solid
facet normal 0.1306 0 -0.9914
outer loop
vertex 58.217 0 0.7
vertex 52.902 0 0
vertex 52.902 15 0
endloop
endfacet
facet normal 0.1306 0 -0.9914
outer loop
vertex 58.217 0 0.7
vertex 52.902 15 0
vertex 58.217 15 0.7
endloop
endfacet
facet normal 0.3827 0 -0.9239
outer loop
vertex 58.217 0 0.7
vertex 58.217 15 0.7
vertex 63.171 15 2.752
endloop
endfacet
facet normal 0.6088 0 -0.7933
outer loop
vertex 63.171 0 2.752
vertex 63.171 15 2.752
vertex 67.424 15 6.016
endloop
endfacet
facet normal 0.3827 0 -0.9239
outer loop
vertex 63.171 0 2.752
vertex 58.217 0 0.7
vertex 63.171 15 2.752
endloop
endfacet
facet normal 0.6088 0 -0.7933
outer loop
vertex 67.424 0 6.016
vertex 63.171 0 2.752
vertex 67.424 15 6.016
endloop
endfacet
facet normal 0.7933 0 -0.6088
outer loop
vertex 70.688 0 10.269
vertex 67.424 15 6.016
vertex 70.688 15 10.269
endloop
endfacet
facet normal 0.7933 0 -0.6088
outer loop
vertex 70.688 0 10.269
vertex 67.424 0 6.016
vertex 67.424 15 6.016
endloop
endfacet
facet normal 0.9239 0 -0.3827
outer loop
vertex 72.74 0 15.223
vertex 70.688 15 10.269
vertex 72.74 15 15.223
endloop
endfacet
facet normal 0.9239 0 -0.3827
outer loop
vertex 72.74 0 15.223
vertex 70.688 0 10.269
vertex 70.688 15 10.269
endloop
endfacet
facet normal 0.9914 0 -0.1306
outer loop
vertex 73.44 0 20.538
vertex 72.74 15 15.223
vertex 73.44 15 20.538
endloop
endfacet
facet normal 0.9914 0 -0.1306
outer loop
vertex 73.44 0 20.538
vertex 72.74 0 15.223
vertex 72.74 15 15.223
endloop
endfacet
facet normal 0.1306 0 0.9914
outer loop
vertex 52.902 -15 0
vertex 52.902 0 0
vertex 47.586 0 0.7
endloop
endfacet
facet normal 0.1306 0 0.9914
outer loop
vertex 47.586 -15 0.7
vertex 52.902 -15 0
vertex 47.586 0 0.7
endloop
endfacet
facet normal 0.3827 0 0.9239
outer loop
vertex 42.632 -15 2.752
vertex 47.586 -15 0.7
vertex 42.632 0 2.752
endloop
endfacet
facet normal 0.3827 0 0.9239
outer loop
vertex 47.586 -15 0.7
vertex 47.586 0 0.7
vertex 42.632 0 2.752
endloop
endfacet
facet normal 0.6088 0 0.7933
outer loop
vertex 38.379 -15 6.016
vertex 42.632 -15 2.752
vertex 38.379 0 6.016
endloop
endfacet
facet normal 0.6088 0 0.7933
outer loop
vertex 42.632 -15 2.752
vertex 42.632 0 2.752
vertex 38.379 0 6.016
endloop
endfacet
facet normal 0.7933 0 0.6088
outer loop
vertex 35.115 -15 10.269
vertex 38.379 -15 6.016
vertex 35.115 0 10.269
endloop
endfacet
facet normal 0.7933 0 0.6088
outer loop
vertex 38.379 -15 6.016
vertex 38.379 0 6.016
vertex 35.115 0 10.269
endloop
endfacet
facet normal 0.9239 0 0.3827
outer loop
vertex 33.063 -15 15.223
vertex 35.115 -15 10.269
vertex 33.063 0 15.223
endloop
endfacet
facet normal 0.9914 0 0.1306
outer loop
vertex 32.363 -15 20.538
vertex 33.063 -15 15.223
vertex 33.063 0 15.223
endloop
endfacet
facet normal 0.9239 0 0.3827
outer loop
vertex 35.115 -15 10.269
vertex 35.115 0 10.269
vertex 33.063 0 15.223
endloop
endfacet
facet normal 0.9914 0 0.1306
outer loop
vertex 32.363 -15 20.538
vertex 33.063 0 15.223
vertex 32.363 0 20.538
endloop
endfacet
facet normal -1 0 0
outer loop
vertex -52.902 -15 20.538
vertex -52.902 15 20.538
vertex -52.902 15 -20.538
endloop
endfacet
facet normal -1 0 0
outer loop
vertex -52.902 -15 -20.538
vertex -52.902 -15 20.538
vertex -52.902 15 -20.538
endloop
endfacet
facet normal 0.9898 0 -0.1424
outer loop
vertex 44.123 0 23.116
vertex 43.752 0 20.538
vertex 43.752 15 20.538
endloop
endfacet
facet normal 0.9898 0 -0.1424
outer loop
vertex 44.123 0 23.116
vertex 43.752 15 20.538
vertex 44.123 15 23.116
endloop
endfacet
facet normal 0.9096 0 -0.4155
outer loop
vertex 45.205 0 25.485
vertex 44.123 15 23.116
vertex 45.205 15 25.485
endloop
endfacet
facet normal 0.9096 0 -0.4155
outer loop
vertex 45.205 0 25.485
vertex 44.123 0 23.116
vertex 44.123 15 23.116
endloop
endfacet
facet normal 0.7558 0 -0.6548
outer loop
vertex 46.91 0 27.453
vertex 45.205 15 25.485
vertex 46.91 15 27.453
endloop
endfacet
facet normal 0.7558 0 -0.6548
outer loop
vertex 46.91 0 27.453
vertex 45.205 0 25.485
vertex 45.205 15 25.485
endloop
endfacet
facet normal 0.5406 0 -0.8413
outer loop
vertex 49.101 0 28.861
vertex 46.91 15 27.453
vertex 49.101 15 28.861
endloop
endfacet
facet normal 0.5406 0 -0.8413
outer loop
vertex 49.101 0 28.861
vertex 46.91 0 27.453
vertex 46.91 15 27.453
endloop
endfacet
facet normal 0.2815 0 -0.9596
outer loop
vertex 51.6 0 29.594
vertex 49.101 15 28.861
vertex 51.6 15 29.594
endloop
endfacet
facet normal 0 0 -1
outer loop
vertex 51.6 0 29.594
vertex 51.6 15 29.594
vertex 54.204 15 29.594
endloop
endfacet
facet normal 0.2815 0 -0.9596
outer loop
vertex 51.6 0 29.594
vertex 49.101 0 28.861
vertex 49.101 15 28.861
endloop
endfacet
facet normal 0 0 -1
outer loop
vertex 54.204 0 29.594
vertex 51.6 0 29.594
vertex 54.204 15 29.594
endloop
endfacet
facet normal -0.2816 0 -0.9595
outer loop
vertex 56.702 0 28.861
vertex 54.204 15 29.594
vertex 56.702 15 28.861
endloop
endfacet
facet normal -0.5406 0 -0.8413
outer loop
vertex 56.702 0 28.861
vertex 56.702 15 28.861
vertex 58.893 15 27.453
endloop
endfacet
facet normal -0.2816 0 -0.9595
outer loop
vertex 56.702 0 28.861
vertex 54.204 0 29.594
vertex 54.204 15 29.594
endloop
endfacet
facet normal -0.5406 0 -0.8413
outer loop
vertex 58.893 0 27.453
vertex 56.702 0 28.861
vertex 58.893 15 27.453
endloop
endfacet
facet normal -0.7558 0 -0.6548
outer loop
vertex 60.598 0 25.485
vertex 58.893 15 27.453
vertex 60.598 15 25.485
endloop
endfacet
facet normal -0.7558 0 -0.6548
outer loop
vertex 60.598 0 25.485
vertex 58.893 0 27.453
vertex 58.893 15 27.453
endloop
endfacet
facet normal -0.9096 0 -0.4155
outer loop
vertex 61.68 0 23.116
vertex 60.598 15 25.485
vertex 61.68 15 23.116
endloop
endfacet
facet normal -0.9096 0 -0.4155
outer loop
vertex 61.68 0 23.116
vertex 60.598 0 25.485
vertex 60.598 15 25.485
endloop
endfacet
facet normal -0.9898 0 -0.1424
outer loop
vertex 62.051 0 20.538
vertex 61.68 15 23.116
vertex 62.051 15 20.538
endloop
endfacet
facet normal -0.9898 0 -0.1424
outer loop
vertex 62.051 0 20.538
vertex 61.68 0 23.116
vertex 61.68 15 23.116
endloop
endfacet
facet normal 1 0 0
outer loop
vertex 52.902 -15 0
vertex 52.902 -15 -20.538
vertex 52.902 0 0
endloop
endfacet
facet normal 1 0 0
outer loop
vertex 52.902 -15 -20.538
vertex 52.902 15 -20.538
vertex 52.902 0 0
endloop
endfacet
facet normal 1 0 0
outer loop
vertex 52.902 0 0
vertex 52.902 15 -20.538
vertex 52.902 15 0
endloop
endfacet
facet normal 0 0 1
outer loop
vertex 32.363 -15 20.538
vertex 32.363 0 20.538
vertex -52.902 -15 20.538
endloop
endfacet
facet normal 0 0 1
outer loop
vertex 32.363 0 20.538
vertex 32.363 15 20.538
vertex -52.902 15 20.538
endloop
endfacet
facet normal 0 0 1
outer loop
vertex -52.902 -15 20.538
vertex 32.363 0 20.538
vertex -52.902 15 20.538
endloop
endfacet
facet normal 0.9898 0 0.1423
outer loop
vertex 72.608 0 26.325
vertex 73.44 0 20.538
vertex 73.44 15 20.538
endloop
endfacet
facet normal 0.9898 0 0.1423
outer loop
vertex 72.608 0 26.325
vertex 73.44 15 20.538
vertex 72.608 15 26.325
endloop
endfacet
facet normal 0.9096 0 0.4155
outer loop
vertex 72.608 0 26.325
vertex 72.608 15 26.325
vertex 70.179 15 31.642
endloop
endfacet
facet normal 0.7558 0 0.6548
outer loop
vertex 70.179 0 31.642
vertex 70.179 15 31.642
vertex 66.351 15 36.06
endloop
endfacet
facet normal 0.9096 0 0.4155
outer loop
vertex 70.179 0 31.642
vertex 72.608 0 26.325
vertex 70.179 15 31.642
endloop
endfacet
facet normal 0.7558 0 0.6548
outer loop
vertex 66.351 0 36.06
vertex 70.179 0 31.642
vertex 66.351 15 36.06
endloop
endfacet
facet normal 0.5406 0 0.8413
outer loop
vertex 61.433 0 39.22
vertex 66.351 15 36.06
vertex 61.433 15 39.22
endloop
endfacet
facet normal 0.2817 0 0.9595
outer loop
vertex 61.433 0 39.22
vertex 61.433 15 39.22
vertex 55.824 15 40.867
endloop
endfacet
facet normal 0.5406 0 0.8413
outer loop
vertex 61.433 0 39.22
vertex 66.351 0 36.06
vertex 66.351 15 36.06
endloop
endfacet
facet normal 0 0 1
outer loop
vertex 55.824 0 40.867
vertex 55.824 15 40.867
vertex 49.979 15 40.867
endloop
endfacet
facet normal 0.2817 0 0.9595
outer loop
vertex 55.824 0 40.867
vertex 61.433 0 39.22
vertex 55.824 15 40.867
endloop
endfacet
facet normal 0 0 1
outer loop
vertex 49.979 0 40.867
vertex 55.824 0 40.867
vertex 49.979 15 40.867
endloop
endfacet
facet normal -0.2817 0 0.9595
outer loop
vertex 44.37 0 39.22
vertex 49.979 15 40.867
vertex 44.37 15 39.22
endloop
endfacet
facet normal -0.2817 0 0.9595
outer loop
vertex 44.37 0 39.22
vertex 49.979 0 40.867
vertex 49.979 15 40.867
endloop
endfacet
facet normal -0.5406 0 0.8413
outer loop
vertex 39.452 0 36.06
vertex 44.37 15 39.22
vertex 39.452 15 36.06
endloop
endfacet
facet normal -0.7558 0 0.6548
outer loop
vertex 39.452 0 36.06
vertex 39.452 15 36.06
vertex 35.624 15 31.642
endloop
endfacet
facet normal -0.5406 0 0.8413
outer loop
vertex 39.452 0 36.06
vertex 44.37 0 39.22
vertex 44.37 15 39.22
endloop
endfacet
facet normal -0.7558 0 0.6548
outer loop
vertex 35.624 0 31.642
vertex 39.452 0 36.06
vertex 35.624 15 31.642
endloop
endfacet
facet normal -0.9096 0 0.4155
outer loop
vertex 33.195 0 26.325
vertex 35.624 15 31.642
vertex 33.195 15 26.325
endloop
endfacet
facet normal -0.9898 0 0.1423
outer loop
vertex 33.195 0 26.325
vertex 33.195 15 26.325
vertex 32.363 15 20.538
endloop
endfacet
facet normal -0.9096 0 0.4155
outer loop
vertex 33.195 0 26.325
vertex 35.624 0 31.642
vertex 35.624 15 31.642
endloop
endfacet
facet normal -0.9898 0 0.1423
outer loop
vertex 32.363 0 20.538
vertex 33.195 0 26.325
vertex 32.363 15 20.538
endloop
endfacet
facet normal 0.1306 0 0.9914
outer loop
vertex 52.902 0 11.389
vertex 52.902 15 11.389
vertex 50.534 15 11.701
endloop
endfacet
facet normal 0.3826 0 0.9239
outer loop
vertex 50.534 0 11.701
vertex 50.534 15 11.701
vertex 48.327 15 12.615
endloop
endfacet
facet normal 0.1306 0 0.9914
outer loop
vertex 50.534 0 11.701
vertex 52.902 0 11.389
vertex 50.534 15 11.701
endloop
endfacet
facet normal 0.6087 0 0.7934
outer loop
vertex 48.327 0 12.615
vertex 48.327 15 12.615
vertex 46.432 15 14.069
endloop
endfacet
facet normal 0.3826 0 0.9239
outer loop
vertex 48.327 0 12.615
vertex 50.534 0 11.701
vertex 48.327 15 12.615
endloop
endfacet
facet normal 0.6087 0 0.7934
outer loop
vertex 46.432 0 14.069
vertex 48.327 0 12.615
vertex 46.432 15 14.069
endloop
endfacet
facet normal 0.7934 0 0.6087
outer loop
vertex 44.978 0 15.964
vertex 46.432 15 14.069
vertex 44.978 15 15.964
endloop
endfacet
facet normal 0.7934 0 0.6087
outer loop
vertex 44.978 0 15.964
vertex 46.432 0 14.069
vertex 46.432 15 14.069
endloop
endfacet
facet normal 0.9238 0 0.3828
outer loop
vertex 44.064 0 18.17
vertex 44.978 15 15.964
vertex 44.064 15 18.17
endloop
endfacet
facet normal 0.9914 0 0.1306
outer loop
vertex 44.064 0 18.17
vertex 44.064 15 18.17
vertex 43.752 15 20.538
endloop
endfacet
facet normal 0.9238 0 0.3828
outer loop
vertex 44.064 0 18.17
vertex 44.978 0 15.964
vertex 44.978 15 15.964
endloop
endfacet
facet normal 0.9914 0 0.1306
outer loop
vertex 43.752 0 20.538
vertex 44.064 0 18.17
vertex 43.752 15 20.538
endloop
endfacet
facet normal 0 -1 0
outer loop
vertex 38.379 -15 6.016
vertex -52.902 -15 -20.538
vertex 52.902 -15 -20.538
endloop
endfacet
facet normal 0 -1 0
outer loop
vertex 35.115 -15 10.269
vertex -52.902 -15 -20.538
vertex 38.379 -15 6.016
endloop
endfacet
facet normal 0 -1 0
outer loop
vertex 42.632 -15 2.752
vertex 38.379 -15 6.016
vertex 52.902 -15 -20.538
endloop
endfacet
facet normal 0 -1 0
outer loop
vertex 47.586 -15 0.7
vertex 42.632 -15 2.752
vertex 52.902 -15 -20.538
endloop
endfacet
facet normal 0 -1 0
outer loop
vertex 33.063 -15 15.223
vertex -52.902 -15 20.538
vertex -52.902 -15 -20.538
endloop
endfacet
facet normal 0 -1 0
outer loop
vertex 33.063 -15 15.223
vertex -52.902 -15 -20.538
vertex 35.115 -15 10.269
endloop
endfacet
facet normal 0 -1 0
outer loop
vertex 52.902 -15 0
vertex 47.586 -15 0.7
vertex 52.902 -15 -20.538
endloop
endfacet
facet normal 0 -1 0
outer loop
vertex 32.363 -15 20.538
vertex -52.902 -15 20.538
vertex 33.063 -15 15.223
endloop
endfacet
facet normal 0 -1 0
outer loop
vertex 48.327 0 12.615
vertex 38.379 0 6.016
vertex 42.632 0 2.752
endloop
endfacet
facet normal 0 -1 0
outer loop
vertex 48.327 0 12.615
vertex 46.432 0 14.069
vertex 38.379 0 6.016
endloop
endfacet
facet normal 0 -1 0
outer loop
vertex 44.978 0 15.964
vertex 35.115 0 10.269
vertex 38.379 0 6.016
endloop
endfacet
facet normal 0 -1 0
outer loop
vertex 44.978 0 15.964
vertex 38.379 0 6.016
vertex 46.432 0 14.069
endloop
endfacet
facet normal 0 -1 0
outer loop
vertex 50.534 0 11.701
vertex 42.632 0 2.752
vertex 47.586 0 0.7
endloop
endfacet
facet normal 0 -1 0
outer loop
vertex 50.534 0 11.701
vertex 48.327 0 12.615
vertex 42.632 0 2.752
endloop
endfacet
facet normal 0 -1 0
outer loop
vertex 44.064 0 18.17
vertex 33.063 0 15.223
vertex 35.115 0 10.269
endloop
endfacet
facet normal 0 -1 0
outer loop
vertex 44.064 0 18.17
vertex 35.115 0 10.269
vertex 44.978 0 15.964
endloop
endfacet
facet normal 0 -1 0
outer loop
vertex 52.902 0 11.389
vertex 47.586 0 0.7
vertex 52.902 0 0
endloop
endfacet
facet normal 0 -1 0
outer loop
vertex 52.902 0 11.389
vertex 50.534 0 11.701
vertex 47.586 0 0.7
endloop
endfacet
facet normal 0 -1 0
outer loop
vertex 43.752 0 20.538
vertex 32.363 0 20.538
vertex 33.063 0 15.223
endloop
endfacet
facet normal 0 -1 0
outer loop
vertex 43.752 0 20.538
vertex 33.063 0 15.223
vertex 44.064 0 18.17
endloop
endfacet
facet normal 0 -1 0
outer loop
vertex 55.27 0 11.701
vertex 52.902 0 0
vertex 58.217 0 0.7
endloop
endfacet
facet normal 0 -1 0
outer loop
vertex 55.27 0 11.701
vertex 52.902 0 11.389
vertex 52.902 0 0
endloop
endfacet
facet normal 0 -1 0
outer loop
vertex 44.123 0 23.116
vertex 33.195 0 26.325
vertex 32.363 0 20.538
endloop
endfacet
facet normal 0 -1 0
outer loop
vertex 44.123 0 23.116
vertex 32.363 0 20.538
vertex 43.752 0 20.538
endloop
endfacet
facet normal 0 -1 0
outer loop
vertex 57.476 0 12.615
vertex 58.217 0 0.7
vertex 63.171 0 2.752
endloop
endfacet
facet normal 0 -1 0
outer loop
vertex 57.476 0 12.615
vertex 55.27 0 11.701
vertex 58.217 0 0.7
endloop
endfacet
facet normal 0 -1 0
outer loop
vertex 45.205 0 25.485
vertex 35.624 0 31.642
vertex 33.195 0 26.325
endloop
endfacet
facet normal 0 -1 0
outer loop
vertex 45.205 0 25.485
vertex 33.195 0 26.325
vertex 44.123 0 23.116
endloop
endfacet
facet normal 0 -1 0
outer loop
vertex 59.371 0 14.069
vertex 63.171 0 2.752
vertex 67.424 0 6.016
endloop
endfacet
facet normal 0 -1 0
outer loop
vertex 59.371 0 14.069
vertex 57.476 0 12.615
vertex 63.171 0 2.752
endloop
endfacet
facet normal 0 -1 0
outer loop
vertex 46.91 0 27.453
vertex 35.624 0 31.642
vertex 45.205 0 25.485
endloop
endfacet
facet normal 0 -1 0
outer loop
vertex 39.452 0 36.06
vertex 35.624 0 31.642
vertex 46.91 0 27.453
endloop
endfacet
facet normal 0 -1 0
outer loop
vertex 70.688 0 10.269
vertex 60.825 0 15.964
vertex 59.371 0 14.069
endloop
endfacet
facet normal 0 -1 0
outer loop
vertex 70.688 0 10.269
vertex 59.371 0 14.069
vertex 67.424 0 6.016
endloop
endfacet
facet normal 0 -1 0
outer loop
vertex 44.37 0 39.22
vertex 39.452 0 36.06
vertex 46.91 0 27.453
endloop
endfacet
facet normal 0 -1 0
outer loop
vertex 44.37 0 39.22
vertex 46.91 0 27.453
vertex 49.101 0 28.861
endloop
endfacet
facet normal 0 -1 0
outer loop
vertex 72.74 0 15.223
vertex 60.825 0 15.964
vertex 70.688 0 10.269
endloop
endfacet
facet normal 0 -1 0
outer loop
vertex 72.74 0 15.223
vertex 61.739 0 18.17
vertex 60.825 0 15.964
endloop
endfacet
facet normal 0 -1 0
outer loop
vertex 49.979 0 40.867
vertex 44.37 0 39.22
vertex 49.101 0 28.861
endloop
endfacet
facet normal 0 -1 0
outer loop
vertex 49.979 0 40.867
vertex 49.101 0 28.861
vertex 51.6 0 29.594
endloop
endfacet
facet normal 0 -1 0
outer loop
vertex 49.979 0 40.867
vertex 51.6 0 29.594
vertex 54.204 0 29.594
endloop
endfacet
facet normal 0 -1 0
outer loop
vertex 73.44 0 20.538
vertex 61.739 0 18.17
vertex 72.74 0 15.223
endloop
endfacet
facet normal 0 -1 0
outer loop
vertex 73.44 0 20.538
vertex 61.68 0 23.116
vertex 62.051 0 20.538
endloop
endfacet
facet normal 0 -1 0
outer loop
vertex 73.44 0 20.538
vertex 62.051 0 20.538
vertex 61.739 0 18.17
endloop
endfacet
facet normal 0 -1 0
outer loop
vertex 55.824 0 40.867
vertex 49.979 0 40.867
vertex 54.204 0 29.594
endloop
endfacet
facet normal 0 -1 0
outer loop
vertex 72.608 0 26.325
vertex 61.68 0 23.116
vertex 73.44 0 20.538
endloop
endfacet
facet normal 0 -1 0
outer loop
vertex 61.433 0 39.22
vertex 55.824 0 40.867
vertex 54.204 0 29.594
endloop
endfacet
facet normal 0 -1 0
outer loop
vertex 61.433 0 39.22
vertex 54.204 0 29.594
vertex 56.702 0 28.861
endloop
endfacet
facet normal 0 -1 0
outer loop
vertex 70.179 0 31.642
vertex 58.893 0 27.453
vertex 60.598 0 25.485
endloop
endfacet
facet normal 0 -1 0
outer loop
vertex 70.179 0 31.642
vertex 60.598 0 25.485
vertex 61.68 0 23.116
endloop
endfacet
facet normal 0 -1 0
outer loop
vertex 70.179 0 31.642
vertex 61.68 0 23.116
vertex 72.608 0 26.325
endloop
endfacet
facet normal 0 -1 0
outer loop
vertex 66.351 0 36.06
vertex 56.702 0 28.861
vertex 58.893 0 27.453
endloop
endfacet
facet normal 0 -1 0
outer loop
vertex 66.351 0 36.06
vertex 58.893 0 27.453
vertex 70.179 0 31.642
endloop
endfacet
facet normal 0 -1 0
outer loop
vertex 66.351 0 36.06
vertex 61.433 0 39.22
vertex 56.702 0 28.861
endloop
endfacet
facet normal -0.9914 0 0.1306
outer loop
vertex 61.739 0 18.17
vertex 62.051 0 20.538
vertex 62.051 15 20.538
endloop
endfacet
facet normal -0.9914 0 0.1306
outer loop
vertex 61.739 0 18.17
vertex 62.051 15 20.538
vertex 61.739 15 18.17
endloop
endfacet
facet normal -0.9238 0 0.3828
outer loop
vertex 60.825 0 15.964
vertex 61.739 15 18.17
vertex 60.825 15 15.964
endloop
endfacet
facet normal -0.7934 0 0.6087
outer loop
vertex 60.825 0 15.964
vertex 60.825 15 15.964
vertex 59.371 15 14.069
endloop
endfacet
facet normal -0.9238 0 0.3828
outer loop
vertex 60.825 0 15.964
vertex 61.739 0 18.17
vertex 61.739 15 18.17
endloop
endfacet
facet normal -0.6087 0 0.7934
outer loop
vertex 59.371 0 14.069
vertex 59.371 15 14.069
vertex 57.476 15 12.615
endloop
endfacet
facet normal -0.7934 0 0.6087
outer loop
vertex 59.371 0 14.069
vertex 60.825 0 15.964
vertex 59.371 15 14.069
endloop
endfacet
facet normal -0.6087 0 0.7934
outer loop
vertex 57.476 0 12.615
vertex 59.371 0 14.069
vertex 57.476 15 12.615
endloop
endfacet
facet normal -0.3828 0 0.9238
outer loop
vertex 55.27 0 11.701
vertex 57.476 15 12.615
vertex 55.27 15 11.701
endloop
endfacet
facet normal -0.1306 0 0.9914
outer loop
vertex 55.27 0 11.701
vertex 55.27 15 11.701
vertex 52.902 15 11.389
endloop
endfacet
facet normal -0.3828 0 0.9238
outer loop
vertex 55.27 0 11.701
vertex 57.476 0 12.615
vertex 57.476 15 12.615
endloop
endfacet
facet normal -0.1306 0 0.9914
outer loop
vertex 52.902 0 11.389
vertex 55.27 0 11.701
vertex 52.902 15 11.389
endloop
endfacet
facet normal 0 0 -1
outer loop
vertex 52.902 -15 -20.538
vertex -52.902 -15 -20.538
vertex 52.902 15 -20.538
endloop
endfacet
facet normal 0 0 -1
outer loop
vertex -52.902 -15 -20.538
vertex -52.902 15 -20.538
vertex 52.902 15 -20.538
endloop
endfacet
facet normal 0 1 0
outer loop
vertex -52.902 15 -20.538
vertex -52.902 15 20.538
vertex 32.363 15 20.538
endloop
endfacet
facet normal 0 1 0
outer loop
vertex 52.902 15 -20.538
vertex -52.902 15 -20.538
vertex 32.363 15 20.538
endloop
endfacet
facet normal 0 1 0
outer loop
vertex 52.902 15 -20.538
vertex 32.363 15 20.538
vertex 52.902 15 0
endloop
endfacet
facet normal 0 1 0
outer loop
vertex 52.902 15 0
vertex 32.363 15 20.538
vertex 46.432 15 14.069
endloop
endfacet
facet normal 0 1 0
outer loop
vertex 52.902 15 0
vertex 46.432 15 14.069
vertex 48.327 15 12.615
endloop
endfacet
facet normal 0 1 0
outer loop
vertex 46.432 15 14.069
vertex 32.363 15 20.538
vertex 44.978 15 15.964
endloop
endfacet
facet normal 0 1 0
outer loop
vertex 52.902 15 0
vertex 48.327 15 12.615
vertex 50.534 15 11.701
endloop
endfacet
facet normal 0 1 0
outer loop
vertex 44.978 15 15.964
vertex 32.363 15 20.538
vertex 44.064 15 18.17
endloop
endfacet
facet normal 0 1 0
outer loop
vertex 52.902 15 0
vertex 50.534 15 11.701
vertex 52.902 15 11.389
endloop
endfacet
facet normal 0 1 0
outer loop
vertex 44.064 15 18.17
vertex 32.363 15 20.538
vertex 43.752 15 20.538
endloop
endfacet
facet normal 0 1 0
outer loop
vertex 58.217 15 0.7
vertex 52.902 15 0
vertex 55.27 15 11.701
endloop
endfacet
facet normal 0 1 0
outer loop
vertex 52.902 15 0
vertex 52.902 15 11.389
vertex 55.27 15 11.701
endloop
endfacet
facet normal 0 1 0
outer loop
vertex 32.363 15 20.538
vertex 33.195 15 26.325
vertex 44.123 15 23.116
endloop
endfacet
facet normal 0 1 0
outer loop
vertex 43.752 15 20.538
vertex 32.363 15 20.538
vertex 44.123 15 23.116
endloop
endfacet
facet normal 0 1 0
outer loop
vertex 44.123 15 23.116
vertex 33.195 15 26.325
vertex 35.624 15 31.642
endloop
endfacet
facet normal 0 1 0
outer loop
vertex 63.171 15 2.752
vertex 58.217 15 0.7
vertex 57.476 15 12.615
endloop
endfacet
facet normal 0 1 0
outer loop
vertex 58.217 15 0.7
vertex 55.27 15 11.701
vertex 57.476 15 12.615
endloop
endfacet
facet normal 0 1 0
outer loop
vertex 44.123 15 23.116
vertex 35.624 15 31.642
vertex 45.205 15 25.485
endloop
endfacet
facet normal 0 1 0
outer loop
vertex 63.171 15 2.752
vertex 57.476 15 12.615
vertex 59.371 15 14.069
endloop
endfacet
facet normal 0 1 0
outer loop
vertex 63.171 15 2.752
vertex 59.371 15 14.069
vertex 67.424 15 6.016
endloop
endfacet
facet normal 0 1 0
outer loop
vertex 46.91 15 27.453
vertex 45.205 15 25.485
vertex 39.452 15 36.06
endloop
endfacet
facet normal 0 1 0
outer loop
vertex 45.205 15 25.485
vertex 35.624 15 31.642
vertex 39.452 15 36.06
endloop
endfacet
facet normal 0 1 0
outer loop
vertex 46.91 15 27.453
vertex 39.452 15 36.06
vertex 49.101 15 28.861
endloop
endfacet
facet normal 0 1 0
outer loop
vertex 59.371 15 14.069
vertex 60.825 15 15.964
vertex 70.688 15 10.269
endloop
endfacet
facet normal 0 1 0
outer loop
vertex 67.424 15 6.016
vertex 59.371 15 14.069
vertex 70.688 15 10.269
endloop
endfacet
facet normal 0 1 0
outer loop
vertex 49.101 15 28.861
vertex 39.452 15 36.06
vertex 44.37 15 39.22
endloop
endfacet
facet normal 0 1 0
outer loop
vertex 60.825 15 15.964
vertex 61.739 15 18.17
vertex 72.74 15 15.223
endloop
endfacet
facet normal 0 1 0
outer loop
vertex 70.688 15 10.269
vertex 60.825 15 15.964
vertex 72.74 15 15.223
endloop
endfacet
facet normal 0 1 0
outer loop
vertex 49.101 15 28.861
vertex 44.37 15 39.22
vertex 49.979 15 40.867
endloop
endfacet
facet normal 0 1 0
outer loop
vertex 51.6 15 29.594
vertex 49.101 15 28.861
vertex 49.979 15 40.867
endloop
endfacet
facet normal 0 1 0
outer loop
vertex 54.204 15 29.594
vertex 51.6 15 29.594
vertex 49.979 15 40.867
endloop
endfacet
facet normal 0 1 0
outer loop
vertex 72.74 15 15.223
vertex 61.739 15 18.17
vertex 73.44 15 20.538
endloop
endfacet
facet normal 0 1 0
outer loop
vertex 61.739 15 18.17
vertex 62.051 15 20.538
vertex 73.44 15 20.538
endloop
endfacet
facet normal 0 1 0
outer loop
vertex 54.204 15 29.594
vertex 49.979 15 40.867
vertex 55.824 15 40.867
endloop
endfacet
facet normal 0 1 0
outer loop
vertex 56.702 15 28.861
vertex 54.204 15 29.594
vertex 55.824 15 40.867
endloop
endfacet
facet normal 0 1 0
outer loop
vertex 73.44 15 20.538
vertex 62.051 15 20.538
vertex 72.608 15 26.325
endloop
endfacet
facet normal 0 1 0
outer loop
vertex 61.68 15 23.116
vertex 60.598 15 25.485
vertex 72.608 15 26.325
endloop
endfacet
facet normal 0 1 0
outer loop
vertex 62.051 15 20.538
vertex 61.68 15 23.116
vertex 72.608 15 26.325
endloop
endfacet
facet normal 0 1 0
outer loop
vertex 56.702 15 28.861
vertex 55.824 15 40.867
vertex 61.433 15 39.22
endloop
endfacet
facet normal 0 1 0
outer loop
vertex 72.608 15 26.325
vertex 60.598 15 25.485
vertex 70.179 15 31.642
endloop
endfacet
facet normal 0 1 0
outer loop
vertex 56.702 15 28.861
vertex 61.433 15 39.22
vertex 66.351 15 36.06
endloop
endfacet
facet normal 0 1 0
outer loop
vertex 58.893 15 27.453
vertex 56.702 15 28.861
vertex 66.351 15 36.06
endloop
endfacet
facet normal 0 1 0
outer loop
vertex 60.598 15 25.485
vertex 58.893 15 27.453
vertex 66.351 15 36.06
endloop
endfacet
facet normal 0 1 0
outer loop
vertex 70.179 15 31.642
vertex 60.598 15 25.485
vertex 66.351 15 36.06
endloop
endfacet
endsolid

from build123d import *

# Parameters (mm, degrees)
F1_DEPTH = 15
F2_DEPTH = 15
F3_DEPTH = 15


with BuildPart() as f1:
    # F0 (on Front) → F1 (new body)
    with BuildSketch(Plane.XZ):
        with BuildLine():
            Line((-52.9015958309, 20.53822577), (-52.9015958309, -20.53822577))
            Line((-52.9015958309, -20.53822577), (52.9015958309, -20.53822577))
            Line((52.9015958309, -20.53822577), (52.9015958309, 0))
            ThreePointArc((52.9015958309, 0), (38.3788771154, 6.0155070545), (32.3633700609, 20.53822577))
            Line((32.3633700609, 20.53822577), (-52.9015958309, 20.53822577))
        make_face()
    extrude(amount=-F1_DEPTH)

    # F2 (add): a face of the model
    f2_faces = [f1.faces().sort_by_distance(p)[0] for p in [
        (-3.6461449369, 0, -0.9755146466),
    ]]
    extrude(f2_faces, amount=F2_DEPTH)

    # F0 (on Front) → F3 (join)
    with BuildSketch(Plane.XZ):
        with BuildLine():
            Line((52.9015958309, 11.3889886989), (52.9015958309, 0))
            ThreePointArc((52.9015958309, 0), (67.4243145464, 6.0155070545), (73.4398216009, 20.53822577))
            ThreePointArc((73.4398216009, 20.53822577), (52.9015958309, 41.07645154), (32.3633700609, 20.53822577))
            Line((32.3633700609, 20.53822577), (43.7523587598, 20.53822577))
            ThreePointArc((43.7523587598, 20.53822577), (52.9015958309, 29.6874628411), (62.050832902, 20.53822577))
            ThreePointArc((62.050832902, 20.53822577), (59.3710834066, 14.0687381943), (52.9015958309, 11.3889886989))
        make_face()
        with BuildLine():
            ThreePointArc((32.3633700609, 20.53822577), (38.3788771154, 6.0155070545), (52.9015958309, 0))
            Line((52.9015958309, 0), (52.9015958309, 11.3889886989))
            ThreePointArc((52.9015958309, 11.3889886989), (46.4321082553, 14.0687381943), (43.7523587598, 20.53822577))
            Line((43.7523587598, 20.53822577), (32.3633700609, 20.53822577))
        make_face()
    extrude(amount=-F3_DEPTH)


solid = f1.part
